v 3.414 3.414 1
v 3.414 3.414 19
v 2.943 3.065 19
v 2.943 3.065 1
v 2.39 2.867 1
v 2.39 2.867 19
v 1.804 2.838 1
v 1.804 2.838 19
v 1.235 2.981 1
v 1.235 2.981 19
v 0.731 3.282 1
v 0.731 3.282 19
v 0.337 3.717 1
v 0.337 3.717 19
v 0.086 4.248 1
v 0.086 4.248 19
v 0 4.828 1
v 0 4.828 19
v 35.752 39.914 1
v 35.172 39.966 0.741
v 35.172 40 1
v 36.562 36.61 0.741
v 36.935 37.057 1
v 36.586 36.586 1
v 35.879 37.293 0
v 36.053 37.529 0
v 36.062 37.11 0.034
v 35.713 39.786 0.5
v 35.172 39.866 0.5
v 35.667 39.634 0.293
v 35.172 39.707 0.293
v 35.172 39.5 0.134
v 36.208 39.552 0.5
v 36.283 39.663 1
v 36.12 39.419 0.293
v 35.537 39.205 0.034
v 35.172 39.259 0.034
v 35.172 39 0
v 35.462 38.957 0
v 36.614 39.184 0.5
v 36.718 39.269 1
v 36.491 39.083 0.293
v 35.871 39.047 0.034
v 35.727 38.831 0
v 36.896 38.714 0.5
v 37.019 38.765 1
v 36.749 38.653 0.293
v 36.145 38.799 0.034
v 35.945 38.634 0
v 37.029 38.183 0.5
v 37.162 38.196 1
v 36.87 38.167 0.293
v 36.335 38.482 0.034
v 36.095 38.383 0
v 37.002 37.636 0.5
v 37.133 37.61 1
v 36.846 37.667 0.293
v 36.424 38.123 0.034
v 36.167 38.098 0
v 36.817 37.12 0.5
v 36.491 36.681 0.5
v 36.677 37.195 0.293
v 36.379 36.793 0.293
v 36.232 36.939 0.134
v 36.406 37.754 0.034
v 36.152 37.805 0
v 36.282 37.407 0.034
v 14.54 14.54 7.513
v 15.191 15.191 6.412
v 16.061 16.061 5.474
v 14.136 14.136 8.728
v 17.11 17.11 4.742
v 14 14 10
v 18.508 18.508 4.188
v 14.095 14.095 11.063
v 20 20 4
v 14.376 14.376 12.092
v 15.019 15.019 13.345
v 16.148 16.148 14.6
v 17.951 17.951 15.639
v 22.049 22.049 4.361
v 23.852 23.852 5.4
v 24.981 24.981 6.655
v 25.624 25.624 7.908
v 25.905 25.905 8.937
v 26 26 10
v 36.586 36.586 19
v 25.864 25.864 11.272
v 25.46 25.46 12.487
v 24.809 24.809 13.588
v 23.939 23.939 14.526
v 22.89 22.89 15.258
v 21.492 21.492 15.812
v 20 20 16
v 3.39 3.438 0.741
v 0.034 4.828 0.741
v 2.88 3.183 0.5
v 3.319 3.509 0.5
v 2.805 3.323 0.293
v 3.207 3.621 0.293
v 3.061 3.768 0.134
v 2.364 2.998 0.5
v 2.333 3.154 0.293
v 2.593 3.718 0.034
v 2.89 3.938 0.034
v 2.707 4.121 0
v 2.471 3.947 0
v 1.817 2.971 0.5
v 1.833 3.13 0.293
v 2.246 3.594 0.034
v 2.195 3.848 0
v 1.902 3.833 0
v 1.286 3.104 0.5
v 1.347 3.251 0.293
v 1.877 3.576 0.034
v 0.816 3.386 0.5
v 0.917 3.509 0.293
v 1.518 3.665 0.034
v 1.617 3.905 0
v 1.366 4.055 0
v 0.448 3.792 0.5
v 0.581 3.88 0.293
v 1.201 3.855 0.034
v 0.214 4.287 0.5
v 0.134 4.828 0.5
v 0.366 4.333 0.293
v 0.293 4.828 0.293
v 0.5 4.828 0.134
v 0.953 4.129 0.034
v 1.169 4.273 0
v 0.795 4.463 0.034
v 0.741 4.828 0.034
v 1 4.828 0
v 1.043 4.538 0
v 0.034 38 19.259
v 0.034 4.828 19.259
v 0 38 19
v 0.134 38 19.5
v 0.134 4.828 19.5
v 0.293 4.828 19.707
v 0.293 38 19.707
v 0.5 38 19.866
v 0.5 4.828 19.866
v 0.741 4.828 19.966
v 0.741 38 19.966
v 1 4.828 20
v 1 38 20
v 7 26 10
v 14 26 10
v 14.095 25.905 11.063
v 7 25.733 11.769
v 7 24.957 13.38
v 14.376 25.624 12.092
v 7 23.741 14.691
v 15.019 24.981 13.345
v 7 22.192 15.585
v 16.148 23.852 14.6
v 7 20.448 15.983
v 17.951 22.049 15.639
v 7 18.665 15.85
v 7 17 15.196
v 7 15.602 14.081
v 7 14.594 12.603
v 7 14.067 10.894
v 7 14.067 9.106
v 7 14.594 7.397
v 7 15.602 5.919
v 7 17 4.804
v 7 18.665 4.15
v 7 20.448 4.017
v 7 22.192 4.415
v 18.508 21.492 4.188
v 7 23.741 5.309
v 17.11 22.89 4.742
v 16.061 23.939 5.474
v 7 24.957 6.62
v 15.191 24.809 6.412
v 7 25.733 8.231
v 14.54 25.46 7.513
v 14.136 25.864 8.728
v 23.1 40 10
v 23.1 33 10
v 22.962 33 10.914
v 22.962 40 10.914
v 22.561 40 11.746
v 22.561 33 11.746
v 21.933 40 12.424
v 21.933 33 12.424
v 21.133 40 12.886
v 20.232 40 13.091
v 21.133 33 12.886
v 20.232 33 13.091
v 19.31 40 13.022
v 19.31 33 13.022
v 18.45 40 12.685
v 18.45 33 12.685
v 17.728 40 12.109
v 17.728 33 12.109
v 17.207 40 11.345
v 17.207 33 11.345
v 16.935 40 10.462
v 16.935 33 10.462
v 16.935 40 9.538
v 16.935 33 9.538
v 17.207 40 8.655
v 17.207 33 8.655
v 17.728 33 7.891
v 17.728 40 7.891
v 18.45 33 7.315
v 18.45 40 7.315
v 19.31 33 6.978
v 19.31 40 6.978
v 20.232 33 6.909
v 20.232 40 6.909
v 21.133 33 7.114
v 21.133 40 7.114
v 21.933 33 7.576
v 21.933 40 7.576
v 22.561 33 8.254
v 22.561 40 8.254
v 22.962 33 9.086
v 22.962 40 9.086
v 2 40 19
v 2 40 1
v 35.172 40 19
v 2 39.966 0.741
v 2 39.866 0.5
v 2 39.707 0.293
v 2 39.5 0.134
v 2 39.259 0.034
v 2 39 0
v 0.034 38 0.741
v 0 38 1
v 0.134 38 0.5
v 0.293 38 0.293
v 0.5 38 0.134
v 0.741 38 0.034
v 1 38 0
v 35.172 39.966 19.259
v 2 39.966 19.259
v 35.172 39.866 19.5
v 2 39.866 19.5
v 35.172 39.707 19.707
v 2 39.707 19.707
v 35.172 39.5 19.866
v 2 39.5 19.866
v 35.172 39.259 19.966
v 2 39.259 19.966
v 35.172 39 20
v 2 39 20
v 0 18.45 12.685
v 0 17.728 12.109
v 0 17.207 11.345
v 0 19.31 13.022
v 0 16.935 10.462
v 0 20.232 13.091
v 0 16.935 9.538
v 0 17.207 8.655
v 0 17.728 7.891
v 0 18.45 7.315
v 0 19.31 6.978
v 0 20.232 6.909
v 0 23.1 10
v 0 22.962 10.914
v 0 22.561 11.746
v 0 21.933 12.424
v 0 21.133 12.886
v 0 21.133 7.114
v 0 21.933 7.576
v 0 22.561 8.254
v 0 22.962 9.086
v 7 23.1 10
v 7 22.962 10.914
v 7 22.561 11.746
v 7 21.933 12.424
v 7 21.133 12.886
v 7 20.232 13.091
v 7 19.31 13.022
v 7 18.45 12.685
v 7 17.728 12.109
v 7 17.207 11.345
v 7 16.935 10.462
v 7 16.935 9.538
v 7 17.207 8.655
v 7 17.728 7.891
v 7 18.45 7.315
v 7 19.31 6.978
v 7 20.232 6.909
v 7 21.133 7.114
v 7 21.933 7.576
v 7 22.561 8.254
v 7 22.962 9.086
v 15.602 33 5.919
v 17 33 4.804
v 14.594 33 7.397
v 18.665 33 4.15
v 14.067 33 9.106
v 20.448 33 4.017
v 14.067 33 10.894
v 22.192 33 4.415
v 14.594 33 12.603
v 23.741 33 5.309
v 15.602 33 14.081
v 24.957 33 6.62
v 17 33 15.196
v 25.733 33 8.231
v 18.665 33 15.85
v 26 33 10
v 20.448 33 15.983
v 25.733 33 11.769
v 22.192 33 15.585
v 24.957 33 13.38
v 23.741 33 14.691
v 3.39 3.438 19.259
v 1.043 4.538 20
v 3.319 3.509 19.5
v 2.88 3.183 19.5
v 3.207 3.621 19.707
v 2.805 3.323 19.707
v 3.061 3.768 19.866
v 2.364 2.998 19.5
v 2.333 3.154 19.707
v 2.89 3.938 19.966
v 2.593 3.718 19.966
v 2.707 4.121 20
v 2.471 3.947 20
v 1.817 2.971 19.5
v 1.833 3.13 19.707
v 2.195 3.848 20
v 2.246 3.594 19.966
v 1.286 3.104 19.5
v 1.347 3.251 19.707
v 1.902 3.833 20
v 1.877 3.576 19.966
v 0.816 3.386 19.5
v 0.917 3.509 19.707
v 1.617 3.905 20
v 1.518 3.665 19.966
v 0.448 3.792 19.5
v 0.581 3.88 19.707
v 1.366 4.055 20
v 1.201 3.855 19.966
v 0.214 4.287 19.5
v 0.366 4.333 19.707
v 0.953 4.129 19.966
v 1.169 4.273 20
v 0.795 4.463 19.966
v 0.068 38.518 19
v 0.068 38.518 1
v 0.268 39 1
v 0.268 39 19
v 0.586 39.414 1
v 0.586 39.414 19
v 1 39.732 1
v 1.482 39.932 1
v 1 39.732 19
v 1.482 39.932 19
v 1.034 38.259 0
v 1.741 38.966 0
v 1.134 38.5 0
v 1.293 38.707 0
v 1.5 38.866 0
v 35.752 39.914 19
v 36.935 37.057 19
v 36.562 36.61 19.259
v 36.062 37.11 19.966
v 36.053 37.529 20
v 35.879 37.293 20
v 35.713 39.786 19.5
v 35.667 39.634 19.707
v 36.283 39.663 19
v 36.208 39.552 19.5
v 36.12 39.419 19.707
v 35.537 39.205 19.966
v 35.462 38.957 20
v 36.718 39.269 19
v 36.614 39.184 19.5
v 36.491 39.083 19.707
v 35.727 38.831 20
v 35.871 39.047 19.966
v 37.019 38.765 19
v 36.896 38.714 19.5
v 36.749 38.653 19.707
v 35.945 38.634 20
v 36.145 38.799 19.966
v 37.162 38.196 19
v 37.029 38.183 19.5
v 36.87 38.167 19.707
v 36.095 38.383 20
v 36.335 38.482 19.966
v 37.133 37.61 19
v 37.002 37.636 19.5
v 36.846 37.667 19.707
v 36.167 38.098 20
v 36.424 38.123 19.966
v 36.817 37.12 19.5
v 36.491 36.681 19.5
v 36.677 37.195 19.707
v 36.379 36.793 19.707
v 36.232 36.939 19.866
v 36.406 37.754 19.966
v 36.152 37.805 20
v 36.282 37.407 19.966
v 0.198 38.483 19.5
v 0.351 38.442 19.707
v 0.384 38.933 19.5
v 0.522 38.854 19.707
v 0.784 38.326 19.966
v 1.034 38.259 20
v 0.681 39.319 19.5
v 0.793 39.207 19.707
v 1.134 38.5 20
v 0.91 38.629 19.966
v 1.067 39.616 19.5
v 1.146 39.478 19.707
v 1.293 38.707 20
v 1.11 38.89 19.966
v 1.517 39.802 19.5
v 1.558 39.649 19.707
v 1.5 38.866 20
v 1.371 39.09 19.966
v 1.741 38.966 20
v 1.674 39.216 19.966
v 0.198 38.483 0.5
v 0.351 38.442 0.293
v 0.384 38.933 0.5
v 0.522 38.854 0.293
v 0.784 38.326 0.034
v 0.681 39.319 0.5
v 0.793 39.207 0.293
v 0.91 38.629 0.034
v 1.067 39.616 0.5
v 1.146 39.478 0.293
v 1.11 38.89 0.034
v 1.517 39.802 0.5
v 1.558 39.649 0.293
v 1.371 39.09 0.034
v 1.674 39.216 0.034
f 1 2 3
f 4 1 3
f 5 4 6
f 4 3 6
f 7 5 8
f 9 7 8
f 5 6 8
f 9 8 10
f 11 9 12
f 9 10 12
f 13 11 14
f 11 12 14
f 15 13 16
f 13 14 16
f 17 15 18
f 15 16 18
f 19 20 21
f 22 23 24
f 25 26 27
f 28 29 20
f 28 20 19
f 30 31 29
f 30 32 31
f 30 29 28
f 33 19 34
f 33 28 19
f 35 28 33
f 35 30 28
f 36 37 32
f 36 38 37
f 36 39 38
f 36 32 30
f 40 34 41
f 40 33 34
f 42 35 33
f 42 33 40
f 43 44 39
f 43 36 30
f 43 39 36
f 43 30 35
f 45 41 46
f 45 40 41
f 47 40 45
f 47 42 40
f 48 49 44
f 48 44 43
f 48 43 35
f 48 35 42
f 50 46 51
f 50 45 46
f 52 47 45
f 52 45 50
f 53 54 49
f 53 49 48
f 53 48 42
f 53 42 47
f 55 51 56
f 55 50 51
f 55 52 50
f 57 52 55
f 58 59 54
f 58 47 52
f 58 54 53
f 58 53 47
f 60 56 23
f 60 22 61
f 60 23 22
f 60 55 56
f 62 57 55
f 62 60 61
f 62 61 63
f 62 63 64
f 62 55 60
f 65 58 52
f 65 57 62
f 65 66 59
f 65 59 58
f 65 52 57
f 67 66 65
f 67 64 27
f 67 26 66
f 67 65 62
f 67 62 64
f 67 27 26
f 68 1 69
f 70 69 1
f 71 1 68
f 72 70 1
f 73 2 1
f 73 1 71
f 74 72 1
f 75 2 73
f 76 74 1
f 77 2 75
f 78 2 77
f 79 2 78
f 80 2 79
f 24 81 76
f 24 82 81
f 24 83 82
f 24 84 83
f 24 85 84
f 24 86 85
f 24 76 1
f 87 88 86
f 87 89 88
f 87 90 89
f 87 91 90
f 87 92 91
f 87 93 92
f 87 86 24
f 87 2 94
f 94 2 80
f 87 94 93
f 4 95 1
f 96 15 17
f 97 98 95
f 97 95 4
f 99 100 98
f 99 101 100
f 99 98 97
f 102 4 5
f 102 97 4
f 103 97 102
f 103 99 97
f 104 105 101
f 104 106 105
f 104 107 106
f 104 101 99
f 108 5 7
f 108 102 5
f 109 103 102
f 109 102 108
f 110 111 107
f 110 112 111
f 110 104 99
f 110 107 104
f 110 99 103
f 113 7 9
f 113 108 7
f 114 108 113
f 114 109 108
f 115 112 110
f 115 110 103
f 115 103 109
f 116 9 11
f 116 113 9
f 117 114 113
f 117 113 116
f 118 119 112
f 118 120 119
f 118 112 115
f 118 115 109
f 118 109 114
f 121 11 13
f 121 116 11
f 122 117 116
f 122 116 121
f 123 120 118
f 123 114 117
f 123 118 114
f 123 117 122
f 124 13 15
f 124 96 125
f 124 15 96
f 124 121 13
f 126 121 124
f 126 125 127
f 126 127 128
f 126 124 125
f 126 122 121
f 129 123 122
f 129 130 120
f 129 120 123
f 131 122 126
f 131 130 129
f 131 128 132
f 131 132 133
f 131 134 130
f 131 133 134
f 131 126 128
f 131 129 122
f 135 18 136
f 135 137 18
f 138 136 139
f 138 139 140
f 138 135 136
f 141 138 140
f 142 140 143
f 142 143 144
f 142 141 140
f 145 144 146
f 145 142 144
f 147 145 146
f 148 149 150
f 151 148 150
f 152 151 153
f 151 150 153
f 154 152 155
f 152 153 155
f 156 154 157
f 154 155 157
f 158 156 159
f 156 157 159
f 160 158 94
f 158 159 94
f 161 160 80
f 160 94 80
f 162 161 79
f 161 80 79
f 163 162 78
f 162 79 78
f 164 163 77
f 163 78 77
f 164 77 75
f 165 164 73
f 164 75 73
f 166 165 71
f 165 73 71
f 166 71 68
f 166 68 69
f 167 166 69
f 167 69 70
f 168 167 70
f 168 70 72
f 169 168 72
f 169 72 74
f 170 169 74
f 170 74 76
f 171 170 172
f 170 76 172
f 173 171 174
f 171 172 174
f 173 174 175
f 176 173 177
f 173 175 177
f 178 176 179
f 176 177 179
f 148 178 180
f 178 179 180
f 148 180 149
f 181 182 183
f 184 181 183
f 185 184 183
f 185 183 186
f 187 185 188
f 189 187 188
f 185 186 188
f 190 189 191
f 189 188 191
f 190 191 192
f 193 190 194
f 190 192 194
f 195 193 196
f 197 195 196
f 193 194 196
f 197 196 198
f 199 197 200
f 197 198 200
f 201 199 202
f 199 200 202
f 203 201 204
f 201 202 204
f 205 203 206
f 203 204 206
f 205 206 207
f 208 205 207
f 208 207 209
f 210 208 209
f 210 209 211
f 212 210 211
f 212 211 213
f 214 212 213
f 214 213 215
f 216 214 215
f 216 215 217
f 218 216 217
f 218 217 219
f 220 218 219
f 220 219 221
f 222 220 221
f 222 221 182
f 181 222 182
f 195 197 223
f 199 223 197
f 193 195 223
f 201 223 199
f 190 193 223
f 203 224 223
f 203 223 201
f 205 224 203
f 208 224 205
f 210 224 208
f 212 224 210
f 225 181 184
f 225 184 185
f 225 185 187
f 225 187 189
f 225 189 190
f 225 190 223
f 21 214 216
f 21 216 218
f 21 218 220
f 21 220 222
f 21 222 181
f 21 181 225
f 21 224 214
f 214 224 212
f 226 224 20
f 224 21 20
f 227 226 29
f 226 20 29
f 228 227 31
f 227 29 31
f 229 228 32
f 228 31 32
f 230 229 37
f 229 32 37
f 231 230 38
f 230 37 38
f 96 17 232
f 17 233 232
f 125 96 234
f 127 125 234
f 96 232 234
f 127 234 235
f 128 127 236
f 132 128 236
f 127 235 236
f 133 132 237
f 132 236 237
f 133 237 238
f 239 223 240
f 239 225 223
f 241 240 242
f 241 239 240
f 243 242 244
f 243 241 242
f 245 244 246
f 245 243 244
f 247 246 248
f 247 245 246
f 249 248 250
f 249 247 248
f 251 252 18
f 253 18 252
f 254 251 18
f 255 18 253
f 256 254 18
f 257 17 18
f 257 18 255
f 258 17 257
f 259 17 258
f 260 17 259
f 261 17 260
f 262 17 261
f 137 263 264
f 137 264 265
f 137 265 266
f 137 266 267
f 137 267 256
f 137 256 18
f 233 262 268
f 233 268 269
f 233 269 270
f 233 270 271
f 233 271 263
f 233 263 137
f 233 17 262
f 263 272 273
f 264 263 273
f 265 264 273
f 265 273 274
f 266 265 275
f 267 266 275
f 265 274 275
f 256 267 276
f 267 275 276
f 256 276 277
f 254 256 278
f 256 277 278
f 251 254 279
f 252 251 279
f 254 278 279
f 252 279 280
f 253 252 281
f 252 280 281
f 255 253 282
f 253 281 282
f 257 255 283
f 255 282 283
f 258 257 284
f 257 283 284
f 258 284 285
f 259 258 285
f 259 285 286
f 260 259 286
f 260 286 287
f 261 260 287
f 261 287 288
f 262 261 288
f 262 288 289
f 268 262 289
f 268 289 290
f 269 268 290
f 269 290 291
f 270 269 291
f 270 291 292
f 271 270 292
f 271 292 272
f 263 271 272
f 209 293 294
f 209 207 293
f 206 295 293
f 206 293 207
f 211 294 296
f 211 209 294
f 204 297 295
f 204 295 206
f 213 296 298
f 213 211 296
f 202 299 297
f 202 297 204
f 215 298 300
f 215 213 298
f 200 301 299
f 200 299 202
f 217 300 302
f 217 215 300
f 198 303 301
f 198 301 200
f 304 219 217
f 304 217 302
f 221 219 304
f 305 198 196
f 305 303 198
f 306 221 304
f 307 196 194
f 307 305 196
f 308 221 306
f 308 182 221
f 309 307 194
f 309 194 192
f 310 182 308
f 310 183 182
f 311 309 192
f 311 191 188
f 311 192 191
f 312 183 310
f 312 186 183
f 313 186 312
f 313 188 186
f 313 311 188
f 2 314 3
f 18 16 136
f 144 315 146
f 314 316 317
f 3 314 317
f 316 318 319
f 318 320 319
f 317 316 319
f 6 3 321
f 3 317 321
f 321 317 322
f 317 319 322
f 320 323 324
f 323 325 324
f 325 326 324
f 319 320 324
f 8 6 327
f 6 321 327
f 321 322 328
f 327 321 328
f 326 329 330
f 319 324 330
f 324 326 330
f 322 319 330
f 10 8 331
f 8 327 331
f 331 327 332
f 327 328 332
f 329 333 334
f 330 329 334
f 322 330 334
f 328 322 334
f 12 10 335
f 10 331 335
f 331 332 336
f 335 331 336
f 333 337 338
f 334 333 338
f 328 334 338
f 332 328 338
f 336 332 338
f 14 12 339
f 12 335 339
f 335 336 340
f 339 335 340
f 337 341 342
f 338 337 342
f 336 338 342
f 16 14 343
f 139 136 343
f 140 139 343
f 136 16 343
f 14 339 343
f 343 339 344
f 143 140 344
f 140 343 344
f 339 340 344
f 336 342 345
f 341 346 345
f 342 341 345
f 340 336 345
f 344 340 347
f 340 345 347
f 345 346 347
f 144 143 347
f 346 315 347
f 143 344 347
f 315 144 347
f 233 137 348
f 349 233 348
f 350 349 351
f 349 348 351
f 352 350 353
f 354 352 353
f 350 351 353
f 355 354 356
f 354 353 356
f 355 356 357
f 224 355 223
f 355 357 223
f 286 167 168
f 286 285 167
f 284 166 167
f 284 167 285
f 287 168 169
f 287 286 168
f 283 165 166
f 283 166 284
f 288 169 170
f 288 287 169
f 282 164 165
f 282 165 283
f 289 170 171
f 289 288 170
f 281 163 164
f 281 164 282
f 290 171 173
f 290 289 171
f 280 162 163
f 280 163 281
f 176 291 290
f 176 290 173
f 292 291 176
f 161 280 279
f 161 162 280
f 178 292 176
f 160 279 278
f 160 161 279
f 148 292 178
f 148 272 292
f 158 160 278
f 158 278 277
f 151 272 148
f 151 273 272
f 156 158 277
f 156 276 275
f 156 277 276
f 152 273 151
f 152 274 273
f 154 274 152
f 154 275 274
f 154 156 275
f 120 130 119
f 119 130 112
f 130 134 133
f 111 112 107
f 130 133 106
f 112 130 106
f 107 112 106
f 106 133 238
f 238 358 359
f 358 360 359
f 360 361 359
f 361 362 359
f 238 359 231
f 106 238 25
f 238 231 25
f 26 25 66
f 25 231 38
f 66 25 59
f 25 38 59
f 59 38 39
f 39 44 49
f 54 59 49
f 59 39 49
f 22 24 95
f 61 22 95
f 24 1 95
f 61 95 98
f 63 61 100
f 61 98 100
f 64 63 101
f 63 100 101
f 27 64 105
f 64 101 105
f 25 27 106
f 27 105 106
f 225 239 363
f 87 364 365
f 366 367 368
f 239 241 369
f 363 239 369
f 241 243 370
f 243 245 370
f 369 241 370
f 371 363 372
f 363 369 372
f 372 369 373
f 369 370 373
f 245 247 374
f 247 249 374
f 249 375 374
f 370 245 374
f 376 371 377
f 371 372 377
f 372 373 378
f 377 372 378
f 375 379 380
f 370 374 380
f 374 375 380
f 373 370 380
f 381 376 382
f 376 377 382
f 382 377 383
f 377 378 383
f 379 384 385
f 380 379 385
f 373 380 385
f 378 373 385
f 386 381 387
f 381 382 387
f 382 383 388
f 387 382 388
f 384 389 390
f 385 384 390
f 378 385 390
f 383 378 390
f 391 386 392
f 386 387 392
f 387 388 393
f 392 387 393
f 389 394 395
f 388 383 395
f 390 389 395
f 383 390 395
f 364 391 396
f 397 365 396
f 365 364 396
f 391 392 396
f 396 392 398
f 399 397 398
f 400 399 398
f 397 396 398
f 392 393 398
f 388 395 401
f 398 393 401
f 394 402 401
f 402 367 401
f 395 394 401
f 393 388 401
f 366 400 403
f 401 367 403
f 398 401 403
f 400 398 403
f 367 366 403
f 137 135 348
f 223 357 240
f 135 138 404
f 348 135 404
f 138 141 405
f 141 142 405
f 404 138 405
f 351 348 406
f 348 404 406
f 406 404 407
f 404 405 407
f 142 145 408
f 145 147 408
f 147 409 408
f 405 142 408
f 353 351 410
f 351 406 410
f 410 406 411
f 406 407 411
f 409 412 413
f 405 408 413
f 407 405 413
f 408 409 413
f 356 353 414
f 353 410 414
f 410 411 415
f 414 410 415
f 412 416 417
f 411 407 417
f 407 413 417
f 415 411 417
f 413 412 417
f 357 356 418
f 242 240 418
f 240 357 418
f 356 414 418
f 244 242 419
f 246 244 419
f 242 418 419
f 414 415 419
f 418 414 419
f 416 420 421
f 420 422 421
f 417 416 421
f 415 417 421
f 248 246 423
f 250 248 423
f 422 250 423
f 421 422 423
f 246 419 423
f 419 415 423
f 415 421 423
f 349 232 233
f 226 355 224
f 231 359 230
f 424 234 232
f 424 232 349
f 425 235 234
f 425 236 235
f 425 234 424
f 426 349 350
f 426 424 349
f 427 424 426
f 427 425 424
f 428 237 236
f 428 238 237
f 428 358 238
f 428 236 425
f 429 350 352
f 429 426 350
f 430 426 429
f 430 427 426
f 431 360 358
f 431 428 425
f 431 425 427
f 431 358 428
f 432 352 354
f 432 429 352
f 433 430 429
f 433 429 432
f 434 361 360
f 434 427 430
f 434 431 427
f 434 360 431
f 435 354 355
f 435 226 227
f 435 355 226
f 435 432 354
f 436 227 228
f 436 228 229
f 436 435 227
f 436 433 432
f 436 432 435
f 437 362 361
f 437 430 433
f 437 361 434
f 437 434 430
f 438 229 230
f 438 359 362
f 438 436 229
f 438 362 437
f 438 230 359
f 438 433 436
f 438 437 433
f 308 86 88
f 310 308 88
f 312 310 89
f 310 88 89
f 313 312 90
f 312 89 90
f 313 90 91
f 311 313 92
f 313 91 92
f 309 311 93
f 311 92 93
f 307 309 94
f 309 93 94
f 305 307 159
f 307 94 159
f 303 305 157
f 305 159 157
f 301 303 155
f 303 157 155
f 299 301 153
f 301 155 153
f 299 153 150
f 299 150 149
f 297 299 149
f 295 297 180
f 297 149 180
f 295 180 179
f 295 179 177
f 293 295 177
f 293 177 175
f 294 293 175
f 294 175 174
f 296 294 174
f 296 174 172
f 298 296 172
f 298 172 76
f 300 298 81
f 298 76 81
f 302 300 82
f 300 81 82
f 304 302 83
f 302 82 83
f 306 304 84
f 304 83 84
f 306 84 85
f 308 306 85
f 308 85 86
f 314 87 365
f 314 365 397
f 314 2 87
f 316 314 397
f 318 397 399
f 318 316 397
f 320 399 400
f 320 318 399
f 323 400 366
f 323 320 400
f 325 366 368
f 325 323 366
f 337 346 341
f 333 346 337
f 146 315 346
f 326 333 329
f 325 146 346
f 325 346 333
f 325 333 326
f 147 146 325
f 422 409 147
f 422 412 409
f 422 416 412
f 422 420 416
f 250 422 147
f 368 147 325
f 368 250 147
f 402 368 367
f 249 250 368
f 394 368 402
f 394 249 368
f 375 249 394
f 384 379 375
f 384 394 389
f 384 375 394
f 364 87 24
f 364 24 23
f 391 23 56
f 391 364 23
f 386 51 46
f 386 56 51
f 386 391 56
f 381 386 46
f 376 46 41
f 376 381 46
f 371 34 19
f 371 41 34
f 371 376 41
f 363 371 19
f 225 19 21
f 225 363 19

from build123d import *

# Parameters (mm, degrees)
SKETCH_W        = 40
SKETCH_H        = 40
PAD_DEPTH       = 20
SKETCH001_R     = 6
POCKET_DEPTH    = 33
SKETCH002_R     = 3.1
POCKET001_DEPTH = 8
SKETCH003_R     = 6
POCKET002_DEPTH = 33
SKETCH004_R     = 3.1
POCKET003_DEPTH = 8
POCKET004_DEPTH = 25
FILLET_R        = 2
FILLET001_R     = 2
FILLET002_R     = 2
FILLET003_R     = 1
FILLET004_R     = 1


with BuildPart() as part:
    # Sketch → Pad (new body)
    with BuildSketch(Plane.XY):
        with Locations((20, 20)):
            Rectangle(SKETCH_W, SKETCH_H)
    extrude(amount=PAD_DEPTH)

    # Sketch001 → Pocket (cut)
    with BuildSketch(Plane.XZ):
        with Locations((20, 10)):
            Circle(SKETCH001_R)
    extrude(amount=-POCKET_DEPTH, mode=Mode.SUBTRACT)

    # Sketch002 → Pocket001 (cut)
    with BuildSketch(Plane.XZ.offset(-33)):
        with Locations((20, 10)):
            Circle(SKETCH002_R)
    extrude(amount=-POCKET001_DEPTH, mode=Mode.SUBTRACT)

    # Sketch003 → Pocket002 (cut)
    with BuildSketch(Plane.YZ.offset(40)):
        with Locations((20, 10)):
            Circle(SKETCH003_R)
    extrude(amount=-POCKET002_DEPTH, mode=Mode.SUBTRACT)

    # Sketch004 → Pocket003 (cut)
    with BuildSketch(Plane.YZ.offset(7)):
        with Locations((20, 10)):
            Circle(SKETCH004_R)
    extrude(amount=-POCKET003_DEPTH, mode=Mode.SUBTRACT)

    # Sketch005 → Pocket004 (cut)
    with BuildSketch(Plane.XY.offset(20)):
        Polygon((0, 0), (40, 40), (40, 0), align=None)
    extrude(amount=-POCKET004_DEPTH, mode=Mode.SUBTRACT)

    # Fillet
    fillet_edges = [part.edges().sort_by_distance(p)[0] for p in [
        (40, 40, 10),
    ]]
    fillet(fillet_edges, radius=FILLET_R)

    # Fillet001
    fillet001_edges = [part.edges().sort_by_distance(p)[0] for p in [
        (0, 0, 10),
    ]]
    fillet(fillet001_edges, radius=FILLET001_R)

    # Fillet002
    fillet002_edges = [part.edges().sort_by_distance(p)[0] for p in [
        (0, 40, 10),
    ]]
    fillet(fillet002_edges, radius=FILLET002_R)

    # Fillet003
    fillet003_edges = [part.edges().sort_by_distance(p)[0] for p in [
        (0, 21.414214, 0),
        (0.585786, 39.414214, 0),
        (1.234633, 2.980668, 0),
        (18.585786, 40, 0),
        (20, 20, 0),
        (37.019332, 38.765367, 0),
    ]]
    fillet(fillet003_edges, radius=FILLET003_R)

    # Fillet004
    fillet004_edges = [part.edges().sort_by_distance(p)[0] for p in [
        (0, 21.414214, 20),
        (0.585786, 39.414214, 20),
        (1.234633, 2.980668, 20),
        (18.585786, 40, 20),
        (20, 20, 20),
        (37.019332, 38.765367, 20),
    ]]
    fillet(fillet004_edges, radius=FILLET004_R)


solid = part.part
